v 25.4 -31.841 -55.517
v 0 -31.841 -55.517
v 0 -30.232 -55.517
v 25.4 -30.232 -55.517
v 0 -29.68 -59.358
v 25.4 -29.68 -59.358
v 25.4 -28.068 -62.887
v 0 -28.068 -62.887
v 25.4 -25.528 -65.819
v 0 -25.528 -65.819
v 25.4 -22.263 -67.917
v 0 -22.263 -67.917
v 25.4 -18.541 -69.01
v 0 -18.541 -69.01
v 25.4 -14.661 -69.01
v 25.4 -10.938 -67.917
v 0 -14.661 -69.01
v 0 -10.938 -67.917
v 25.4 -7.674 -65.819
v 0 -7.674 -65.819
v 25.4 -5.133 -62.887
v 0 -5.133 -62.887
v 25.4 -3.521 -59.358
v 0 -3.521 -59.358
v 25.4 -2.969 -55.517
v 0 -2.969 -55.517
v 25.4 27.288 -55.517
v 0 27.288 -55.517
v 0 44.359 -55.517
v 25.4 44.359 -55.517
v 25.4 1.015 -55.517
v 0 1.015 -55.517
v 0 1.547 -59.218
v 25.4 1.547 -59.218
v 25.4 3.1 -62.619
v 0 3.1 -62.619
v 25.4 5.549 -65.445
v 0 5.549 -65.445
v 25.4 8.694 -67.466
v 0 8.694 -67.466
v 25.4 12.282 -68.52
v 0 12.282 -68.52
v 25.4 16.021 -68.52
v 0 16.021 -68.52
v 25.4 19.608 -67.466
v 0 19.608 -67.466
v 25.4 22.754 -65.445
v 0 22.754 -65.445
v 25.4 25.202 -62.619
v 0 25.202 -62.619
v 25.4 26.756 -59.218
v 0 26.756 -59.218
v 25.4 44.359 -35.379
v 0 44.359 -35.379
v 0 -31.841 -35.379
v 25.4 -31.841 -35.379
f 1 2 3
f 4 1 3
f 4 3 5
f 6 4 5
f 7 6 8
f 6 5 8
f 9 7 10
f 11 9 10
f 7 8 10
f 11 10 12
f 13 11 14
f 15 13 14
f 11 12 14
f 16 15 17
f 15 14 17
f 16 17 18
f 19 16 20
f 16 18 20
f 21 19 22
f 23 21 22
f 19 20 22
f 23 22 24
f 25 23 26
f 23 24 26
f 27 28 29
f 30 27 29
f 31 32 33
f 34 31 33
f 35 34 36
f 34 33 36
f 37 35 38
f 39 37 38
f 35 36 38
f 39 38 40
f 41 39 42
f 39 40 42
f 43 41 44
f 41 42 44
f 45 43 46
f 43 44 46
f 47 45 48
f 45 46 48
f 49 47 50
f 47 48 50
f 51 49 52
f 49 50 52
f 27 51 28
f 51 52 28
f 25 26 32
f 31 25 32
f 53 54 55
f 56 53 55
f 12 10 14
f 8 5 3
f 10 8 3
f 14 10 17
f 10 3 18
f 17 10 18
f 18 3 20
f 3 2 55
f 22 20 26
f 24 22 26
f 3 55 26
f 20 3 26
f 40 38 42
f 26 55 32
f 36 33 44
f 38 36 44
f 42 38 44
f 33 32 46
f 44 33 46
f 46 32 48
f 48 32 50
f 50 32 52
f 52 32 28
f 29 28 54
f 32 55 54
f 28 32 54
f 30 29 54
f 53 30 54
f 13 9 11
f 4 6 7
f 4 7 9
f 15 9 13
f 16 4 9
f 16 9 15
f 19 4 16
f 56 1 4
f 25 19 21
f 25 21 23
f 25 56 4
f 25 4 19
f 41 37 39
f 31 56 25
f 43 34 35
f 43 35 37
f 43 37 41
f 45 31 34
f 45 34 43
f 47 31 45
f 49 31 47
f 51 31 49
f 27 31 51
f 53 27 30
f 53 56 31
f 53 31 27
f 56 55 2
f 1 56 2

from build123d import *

# Parameters (mm, degrees)
F1_DEPTH = 25.4


with BuildPart() as f1:
    # F0 (on Right) → F1 (new body)
    with BuildSketch(Plane.YZ):
        with BuildLine():
            Line((-2.9690999484, -55.5171445012), (-30.2323300445, -55.5171445012))
            ThreePointArc((-30.2323300445, -55.5171445012), (-16.6007149965, -69.1487595492), (-2.9690999484, -55.5171445012))
        make_face()
        with BuildLine():
            ThreePointArc((1.0150714909, -55.5171445012), (14.1514278948, -68.6535009052), (27.2877842988, -55.5171445012))
            Line((27.2877842988, -55.5171445012), (1.0150714909, -55.5171445012))
        make_face()
        with BuildLine():
            ThreePointArc((-2.9690999484, -55.5171445012), (-16.6007149965, -41.8855294532), (-30.2323300445, -55.5171445012))
            Line((-30.2323300445, -55.5171445012), (-2.9690999484, -55.5171445012))
        make_face()
        with BuildLine():
            Line((1.0150714909, -55.5171445012), (27.2877842988, -55.5171445012))
            ThreePointArc((27.2877842988, -55.5171445012), (14.1514278948, -42.3807880973), (1.0150714909, -55.5171445012))
        make_face()
        with BuildLine():
            Line((-31.8407155573, -35.3785715997), (-31.8407155573, -55.5171445012))
            Line((-31.8407155573, -55.5171445012), (-30.2323300445, -55.5171445012))
            ThreePointArc((-30.2323300445, -55.5171445012), (-16.6007149965, -41.8855294532), (-2.9690999484, -55.5171445012))
            Line((-2.9690999484, -55.5171445012), (1.0150714909, -55.5171445012))
            ThreePointArc((1.0150714909, -55.5171445012), (14.1514278948, -42.3807880973), (27.2877842988, -55.5171445012))
            Line((27.2877842988, -55.5171445012), (44.3592844427, -55.5171445012))
            Line((44.3592844427, -55.5171445012), (44.3592844427, -35.3785715997))
            Line((44.3592844427, -35.3785715997), (-31.8407155573, -35.3785715997))
        make_face()
    extrude(amount=F1_DEPTH)


solid = f1.part
